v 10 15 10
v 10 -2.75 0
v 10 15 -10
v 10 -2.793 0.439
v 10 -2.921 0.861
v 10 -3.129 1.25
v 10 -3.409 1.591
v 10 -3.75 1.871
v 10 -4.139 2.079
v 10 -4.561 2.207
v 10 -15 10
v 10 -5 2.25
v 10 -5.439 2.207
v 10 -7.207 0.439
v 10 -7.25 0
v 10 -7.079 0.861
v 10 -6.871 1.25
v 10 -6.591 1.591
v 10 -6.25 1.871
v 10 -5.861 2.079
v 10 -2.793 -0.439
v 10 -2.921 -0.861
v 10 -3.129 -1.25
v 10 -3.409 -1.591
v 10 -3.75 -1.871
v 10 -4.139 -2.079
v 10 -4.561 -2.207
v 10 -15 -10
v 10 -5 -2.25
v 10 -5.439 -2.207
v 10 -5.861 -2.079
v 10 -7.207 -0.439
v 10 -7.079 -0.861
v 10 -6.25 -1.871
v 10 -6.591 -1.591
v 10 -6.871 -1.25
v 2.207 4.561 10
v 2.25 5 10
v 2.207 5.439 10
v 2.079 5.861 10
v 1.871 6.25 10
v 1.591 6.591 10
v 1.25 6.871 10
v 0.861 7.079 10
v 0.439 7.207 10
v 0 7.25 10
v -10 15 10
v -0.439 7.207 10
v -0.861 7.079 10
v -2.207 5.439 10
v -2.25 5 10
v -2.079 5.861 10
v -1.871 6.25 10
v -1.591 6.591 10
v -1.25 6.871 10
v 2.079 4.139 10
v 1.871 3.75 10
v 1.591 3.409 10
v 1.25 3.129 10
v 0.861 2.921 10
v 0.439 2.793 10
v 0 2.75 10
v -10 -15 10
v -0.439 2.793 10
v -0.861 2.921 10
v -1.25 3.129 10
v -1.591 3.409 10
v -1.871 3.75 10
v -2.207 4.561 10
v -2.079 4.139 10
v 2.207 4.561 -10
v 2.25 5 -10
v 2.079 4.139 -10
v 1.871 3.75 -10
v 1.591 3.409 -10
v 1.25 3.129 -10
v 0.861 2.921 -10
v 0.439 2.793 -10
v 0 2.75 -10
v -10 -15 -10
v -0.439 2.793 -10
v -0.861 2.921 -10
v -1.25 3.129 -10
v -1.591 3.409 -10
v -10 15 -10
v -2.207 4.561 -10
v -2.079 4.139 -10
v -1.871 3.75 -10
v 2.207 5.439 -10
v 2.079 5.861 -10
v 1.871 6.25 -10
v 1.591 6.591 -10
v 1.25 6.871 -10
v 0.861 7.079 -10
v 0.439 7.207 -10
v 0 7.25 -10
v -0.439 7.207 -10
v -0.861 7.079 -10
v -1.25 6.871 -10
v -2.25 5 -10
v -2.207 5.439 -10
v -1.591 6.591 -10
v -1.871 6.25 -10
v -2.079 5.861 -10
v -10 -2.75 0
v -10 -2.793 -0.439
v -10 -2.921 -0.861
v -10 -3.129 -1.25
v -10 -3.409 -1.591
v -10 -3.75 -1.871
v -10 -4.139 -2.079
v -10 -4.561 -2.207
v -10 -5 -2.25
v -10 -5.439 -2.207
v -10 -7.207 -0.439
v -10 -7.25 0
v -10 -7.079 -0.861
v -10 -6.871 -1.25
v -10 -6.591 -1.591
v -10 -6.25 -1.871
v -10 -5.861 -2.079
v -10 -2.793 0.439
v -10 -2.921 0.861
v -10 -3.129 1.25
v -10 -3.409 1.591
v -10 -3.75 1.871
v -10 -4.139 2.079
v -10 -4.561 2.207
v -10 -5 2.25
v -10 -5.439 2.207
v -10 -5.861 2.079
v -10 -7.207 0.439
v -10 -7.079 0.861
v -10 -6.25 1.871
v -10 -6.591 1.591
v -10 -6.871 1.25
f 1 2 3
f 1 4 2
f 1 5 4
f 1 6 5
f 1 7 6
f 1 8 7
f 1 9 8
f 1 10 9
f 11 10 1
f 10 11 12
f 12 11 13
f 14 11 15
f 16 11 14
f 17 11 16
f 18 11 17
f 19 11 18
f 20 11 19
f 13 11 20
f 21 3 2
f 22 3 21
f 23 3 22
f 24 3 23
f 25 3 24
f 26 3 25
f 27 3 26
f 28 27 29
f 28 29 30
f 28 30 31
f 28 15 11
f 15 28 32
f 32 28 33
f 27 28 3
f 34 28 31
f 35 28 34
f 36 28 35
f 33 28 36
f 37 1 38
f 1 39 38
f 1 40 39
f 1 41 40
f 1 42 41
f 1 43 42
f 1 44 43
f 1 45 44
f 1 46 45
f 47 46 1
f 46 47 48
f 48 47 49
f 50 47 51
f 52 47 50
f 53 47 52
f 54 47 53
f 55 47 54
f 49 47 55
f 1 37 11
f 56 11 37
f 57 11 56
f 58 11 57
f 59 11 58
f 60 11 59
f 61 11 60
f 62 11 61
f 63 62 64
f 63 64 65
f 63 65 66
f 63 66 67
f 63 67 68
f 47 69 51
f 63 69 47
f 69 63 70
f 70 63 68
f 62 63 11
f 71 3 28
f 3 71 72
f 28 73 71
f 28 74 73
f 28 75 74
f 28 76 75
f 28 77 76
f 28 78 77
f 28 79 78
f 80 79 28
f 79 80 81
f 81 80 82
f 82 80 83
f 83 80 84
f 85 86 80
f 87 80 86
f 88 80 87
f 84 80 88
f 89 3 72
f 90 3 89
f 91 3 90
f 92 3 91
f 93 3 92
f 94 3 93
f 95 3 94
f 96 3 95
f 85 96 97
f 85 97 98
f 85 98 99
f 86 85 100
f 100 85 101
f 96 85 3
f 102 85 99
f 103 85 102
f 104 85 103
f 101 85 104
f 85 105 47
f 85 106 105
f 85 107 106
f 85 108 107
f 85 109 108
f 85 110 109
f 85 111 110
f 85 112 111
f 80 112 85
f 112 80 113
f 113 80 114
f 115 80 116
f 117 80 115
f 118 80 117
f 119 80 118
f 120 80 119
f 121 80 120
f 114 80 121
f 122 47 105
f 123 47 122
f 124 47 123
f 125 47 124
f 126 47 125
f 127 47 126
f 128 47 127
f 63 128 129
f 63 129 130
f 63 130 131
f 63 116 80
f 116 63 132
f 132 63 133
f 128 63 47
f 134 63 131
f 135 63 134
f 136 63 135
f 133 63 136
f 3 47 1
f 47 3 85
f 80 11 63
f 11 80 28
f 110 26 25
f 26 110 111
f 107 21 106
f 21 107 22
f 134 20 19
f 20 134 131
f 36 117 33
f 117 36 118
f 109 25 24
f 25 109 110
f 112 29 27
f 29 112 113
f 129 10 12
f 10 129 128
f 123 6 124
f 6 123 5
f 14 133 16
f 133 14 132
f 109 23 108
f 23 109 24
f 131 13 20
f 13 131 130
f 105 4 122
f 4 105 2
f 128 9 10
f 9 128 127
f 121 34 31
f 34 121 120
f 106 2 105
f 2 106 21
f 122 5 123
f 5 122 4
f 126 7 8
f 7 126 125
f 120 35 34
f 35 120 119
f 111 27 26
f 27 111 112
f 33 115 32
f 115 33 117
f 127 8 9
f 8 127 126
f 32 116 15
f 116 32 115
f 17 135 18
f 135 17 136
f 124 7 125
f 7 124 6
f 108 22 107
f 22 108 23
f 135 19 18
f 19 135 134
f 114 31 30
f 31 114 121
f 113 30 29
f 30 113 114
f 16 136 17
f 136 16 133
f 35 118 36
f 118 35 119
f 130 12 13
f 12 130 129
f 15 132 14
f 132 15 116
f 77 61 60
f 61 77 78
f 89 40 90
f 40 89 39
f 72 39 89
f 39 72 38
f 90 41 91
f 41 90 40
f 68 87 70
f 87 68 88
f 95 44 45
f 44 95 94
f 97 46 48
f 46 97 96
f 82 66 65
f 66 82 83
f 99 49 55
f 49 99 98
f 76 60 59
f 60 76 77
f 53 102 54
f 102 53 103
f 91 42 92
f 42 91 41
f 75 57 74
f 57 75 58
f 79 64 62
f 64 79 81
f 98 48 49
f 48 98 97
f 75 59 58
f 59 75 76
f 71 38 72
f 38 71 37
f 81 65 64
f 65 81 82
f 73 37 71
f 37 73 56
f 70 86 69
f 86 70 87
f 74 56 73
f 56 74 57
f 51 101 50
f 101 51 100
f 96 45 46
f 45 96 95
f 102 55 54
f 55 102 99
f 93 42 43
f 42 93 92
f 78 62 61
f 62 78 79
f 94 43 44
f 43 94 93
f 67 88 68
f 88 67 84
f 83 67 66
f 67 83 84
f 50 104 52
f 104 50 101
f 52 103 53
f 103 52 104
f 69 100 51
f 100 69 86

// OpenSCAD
// Parametric Rectangular Cube with Two M4 Through Holes
// One hole is 90 degrees to the other

// Cube dimensions
cube_length = 20;   // Length in X direction
cube_width = 30;    // Width in Y direction
cube_height = 20;   // Height in Z direction

// Screw hole parameters
m4_diameter = 4.5;  // M4 hole diameter (slightly larger for clearance)
hole1_pos_x = 0;   // X position of first hole
hole1_pos_y = -5;   // Y position of first hole
hole1_pos_z = 0;   // Z position of first hole

hole2_pos_x = 0;   // X position of second hole
hole2_pos_y = 5;   // Y position of second hole
hole2_pos_z = 0;   // Z position of second hole

// Function to create the model
module rectangular_cube_with_holes() {
    difference() {
        // Main rectangular cube
        cube([cube_length, cube_width, cube_height], center = true);
        
        // First hole (along X axis)
        rotate([0, 90, 0])
            translate([-(hole1_pos_z), hole1_pos_y, -cube_length/2])
                cylinder(h = cube_length, d = m4_diameter, $fn = 32);
        
        // Second hole (along Z axis - 90 degrees to the first hole)
        rotate([0, 0, 0])
            translate([hole2_pos_x, hole2_pos_y, -cube_height/2])
                cylinder(h = cube_height, d = m4_diameter, $fn = 32);
    }
}

// Create the model
rectangular_cube_with_holes();
